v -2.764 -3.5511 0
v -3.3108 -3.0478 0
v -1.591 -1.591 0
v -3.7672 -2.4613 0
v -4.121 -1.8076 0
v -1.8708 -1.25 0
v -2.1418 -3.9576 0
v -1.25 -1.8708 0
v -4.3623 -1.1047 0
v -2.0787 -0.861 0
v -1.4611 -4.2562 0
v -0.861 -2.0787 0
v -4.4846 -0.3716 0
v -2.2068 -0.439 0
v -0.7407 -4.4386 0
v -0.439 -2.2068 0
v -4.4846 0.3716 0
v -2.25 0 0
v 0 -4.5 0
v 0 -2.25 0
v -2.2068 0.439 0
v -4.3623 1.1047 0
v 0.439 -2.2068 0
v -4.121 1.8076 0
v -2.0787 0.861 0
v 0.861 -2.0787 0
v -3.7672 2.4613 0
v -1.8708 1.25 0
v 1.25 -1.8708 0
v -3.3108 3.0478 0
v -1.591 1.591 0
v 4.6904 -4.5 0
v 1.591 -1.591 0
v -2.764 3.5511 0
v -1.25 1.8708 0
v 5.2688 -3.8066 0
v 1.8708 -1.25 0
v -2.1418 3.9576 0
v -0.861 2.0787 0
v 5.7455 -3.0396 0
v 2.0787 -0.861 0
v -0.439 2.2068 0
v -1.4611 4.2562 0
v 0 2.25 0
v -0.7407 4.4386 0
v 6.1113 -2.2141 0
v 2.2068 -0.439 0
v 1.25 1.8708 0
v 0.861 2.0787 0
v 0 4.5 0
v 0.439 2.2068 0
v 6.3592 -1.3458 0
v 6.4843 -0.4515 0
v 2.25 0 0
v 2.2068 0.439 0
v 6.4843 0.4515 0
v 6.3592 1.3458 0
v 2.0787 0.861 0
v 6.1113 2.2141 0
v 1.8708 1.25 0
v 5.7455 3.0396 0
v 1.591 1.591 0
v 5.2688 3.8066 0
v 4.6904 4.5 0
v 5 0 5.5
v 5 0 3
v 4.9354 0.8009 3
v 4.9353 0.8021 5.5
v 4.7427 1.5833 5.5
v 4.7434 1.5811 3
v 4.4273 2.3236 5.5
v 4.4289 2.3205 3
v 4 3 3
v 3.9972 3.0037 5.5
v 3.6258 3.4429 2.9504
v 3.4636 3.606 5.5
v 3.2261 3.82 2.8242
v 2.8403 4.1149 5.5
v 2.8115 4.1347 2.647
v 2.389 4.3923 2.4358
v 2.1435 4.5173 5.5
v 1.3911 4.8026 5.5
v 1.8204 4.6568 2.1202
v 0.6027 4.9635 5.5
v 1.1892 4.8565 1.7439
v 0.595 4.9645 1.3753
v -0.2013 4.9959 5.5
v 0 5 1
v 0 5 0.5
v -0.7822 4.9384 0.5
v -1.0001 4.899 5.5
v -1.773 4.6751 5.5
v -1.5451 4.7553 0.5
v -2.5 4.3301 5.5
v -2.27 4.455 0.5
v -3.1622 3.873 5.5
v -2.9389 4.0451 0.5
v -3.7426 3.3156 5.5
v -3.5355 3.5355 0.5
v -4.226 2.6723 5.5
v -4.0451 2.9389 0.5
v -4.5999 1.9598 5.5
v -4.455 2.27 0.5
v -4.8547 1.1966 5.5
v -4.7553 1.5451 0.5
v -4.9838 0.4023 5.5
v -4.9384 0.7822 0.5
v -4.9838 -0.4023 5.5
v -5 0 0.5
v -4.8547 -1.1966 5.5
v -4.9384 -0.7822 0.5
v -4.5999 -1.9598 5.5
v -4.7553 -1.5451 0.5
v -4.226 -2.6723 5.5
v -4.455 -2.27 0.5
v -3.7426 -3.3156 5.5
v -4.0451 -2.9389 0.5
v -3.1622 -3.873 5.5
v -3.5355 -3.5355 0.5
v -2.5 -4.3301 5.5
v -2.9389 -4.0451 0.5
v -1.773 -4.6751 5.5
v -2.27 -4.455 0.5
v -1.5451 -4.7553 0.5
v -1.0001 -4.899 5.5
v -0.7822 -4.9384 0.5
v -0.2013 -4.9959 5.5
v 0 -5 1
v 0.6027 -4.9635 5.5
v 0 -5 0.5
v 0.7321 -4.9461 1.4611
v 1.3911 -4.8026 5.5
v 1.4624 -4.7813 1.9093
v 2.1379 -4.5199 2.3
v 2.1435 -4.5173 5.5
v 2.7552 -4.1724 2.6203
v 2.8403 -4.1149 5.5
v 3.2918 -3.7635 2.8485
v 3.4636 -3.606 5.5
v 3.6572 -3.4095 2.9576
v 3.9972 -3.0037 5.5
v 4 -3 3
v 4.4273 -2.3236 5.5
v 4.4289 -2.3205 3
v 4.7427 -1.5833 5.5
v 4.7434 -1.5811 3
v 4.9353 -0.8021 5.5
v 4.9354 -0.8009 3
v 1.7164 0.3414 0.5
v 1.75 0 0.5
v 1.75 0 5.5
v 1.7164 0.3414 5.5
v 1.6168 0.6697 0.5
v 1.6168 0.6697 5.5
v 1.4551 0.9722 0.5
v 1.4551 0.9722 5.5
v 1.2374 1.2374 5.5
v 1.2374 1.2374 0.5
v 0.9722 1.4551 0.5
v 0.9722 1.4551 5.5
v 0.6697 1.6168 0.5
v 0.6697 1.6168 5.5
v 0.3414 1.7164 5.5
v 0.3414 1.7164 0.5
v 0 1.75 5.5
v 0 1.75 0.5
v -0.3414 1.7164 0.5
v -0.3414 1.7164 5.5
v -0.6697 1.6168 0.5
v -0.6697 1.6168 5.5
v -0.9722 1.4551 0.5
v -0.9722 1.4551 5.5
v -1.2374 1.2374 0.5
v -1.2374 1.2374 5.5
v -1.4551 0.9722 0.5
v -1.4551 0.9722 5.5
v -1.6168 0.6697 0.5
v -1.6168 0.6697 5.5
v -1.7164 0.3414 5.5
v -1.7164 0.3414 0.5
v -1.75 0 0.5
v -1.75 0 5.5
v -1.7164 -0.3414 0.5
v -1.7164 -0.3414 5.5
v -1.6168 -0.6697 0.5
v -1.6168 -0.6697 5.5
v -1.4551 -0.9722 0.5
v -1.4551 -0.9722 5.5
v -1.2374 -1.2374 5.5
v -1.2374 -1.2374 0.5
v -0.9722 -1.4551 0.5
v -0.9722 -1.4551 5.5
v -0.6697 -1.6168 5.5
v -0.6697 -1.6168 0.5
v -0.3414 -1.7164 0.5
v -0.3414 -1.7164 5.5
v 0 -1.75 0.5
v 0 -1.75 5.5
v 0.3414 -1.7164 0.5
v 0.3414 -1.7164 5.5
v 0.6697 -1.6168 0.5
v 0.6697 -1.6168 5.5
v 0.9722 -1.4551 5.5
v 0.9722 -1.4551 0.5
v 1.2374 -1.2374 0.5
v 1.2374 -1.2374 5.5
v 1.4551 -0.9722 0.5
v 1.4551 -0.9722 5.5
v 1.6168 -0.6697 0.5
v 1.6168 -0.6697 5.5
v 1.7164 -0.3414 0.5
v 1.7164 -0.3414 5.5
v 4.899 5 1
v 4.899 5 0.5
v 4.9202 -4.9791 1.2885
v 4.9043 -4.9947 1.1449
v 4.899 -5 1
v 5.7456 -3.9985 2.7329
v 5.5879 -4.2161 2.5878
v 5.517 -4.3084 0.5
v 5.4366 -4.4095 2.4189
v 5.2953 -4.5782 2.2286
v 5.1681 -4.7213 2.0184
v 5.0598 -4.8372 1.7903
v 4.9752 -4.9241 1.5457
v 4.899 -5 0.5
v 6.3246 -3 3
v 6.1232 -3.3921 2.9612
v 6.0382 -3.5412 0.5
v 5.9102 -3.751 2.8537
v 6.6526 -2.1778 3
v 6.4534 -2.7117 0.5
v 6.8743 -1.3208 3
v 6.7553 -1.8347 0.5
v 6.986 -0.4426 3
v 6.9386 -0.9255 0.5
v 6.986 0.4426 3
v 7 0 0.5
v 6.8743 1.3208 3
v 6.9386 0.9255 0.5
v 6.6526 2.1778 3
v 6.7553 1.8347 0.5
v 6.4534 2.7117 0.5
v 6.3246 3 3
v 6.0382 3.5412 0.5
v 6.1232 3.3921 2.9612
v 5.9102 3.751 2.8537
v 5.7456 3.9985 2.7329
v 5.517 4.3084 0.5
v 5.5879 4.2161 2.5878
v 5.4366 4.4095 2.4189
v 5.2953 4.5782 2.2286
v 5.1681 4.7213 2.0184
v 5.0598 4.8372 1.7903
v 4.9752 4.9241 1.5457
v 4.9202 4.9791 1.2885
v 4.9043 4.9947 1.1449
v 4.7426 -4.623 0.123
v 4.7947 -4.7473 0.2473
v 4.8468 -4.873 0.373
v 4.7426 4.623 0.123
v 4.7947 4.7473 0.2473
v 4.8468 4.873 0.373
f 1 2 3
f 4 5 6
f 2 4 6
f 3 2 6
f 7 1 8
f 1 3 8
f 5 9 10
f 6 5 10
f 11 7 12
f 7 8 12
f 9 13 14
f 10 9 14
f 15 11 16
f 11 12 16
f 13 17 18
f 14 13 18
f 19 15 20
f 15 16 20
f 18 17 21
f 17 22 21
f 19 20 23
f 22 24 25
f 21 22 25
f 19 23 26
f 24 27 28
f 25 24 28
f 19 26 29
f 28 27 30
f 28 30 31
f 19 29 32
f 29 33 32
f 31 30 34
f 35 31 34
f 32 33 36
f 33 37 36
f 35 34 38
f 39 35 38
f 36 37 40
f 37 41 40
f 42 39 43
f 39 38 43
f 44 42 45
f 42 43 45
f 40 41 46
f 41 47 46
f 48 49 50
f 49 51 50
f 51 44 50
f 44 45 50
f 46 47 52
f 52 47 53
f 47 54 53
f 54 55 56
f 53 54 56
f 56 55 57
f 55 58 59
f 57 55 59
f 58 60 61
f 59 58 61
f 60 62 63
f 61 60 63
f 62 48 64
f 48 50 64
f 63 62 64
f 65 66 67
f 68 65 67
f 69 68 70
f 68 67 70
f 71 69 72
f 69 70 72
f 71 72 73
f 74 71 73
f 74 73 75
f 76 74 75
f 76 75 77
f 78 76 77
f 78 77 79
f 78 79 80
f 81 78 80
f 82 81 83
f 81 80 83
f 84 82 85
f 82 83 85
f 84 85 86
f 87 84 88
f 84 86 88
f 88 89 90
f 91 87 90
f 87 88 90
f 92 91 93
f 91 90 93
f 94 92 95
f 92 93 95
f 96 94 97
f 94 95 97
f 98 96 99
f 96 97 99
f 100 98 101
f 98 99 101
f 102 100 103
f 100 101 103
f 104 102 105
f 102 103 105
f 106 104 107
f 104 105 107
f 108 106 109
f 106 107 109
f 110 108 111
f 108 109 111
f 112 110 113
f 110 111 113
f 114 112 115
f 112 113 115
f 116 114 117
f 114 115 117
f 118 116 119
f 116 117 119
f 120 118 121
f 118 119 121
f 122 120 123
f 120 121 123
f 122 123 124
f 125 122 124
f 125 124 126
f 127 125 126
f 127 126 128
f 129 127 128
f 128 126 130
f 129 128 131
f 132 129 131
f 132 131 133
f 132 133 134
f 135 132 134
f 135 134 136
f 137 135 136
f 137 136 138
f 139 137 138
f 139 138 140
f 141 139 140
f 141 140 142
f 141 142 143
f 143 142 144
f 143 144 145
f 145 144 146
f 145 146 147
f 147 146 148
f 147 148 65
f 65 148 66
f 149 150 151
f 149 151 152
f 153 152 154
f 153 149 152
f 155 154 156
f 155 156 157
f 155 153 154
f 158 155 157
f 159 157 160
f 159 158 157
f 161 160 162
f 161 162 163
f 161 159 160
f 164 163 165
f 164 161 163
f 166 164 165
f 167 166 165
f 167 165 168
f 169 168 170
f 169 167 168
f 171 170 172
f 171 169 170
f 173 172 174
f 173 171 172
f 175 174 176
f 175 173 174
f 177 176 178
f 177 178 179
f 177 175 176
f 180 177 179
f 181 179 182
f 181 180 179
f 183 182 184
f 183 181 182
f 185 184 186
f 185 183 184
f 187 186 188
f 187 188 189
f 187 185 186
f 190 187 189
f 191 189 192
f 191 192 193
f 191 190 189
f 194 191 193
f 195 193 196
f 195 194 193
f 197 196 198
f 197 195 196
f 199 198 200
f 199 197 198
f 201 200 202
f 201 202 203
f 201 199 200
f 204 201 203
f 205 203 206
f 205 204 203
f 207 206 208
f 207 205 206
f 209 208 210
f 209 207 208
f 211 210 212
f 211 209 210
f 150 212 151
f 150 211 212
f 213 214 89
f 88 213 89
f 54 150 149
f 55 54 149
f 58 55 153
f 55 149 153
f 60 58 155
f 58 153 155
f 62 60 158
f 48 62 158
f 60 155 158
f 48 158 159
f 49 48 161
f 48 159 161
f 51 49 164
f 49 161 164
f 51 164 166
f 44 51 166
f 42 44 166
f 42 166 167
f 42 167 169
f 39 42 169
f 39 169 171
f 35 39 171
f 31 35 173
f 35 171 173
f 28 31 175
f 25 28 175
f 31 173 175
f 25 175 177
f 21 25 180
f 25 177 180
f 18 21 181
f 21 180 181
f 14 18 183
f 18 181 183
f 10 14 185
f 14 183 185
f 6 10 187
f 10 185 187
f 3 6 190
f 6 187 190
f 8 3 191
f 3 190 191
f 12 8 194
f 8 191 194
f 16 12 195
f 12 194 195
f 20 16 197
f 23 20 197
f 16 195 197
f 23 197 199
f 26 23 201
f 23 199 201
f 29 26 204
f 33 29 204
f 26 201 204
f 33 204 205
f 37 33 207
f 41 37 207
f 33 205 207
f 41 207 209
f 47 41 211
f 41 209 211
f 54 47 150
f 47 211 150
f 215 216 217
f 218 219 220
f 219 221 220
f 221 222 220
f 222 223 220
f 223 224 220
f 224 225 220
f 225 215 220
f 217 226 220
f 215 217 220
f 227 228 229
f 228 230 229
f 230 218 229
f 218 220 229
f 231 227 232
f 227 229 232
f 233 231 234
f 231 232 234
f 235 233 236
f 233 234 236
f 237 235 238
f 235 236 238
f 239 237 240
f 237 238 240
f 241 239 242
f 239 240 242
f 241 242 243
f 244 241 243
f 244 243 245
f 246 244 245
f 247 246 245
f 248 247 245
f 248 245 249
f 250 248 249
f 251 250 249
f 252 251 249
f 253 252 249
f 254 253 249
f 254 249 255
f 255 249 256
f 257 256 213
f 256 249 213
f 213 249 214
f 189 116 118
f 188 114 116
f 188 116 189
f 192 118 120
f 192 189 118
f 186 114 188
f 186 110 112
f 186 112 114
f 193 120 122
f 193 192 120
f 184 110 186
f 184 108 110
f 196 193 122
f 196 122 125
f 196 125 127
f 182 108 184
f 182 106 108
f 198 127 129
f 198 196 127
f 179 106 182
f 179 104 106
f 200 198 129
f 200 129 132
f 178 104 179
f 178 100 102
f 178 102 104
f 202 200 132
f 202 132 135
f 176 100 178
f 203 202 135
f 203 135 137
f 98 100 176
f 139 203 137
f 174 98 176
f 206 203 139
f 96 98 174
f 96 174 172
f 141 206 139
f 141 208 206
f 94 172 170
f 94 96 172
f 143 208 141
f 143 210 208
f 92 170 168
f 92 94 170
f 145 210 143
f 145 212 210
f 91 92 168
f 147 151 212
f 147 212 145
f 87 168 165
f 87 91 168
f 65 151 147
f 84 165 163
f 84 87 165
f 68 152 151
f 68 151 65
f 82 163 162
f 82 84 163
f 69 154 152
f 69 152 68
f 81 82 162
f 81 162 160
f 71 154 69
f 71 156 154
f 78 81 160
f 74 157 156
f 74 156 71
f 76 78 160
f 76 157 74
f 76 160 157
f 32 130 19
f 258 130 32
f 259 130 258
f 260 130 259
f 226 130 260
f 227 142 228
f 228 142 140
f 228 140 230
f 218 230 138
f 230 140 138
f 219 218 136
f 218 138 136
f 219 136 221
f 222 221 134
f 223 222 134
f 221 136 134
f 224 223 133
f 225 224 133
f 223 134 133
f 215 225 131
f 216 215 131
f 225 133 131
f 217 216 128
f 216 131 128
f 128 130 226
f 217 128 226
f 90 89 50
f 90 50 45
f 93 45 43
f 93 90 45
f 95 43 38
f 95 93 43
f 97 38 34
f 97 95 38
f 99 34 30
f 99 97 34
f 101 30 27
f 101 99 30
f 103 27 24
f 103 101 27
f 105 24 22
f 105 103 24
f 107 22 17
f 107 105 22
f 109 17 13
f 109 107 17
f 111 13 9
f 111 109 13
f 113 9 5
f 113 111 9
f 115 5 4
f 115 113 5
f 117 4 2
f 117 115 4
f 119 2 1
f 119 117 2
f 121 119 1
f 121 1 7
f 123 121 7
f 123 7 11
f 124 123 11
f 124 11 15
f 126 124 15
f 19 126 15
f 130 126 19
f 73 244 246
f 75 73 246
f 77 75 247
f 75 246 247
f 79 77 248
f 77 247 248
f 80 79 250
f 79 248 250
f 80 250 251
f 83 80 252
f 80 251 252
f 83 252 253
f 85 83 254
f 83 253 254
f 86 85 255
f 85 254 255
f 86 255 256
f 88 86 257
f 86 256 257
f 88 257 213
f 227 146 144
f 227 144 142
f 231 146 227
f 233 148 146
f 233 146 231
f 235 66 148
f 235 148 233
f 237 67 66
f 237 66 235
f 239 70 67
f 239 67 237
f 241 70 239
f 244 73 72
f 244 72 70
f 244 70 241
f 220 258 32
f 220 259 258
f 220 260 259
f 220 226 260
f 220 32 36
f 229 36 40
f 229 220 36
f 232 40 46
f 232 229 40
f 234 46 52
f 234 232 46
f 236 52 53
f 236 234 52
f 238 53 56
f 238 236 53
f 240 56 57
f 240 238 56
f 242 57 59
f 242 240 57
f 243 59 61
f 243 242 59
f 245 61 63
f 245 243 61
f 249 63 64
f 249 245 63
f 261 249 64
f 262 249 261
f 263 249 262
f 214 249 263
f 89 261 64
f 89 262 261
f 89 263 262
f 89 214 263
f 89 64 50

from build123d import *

# Parameters (mm, degrees)
F0_R         = 5
F0_R_2       = 1.75
F1_DEPTH     = 5.5
F3_DEPTH     = 3
F4_T4_DEPTH  = 14.8989794856
F4_S5_R      = 5
F4_T6_DEPTH  = 9
F4_T10_DEPTH = 14.8989794856
F4_S11_R     = 5
F4_T12_DEPTH = 9
F5_SIZE      = 0.5


# Not quite as in the source:
# - a fillet or chamfer that OpenCascade refuses, or shapes differently, is made with other operations: its cross-section is extruded or revolved along the edge and cut away or added


with BuildPart() as f1:
    # F0 (on Top) → F1 (new body)
    with BuildSketch(Plane.XY):
        Circle(F0_R)
        Circle(F0_R_2, mode=Mode.SUBTRACT)
    extrude(amount=F1_DEPTH)

    # F2 (on Top) → F3 (join)
    with BuildSketch(Plane.XY):
        with BuildLine():
            Line((0, -5), (4.8989794856, -5))
            ThreePointArc((4.8989794856, -5), (7, 0), (4.8989794856, 5))
            Line((4.8989794856, 5), (0, 5))
            ThreePointArc((0, 5), (5, 0), (0, -5))
        make_face()
    extrude(amount=F3_DEPTH)

    # F4: fillet of radius 2 on 2 edges, made by hand


with BuildPart() as f4_tool2:
    # F4_s3 → F4_t4 (new body)
    with BuildSketch(Plane.YZ.offset(-5)):
        with BuildLine():
            ThreePointArc((-3, 3), (-4.4142135624, 2.4142135624), (-5, 1))
            Line((-5, 1), (-5, 3))
            Line((-5, 3), (-3, 3))
        make_face()
    extrude(amount=F4_T4_DEPTH)

    # F4_s5 → F4_t6 (cut, symmetric)
    with BuildSketch(Plane.XY.offset(2)):
        Circle(F4_S5_R)
    extrude(amount=F4_T6_DEPTH, both=True, mode=Mode.SUBTRACT)


with BuildPart() as f1_1:
    add(f1.part)

    # F4_t1: cut F4_tool2
    add(f4_tool2.part, mode=Mode.SUBTRACT)


with BuildPart() as f4_tool8:
    # F4_s9 → F4_t10 (new body)
    with BuildSketch(Plane.YZ.offset(9.8989794856)):
        with BuildLine():
            ThreePointArc((3, 3), (4.4142135624, 2.4142135624), (5, 1))
            Line((5, 1), (5, 3))
            Line((5, 3), (3, 3))
        make_face()
    extrude(amount=-F4_T10_DEPTH)

    # F4_s11 → F4_t12 (cut, symmetric)
    with BuildSketch(Plane.XY.offset(2)):
        Circle(F4_S11_R)
    extrude(amount=F4_T12_DEPTH, both=True, mode=Mode.SUBTRACT)


with BuildPart() as f1_2:
    add(f1_1.part)

    # F4_t7: cut F4_tool8
    add(f4_tool8.part, mode=Mode.SUBTRACT)

    # F5
    f5_edges = [f1_2.edges().sort_by_distance(p)[0] for p in [
        (-5, 0, 0),
        (2.44949, -5, 0),
        (7, 0, 0),
        (2.44949, 5, 0),
        (-1.75, 0, 0),
    ]]
    chamfer(f5_edges, length=F5_SIZE)


solid = f1_2.part
